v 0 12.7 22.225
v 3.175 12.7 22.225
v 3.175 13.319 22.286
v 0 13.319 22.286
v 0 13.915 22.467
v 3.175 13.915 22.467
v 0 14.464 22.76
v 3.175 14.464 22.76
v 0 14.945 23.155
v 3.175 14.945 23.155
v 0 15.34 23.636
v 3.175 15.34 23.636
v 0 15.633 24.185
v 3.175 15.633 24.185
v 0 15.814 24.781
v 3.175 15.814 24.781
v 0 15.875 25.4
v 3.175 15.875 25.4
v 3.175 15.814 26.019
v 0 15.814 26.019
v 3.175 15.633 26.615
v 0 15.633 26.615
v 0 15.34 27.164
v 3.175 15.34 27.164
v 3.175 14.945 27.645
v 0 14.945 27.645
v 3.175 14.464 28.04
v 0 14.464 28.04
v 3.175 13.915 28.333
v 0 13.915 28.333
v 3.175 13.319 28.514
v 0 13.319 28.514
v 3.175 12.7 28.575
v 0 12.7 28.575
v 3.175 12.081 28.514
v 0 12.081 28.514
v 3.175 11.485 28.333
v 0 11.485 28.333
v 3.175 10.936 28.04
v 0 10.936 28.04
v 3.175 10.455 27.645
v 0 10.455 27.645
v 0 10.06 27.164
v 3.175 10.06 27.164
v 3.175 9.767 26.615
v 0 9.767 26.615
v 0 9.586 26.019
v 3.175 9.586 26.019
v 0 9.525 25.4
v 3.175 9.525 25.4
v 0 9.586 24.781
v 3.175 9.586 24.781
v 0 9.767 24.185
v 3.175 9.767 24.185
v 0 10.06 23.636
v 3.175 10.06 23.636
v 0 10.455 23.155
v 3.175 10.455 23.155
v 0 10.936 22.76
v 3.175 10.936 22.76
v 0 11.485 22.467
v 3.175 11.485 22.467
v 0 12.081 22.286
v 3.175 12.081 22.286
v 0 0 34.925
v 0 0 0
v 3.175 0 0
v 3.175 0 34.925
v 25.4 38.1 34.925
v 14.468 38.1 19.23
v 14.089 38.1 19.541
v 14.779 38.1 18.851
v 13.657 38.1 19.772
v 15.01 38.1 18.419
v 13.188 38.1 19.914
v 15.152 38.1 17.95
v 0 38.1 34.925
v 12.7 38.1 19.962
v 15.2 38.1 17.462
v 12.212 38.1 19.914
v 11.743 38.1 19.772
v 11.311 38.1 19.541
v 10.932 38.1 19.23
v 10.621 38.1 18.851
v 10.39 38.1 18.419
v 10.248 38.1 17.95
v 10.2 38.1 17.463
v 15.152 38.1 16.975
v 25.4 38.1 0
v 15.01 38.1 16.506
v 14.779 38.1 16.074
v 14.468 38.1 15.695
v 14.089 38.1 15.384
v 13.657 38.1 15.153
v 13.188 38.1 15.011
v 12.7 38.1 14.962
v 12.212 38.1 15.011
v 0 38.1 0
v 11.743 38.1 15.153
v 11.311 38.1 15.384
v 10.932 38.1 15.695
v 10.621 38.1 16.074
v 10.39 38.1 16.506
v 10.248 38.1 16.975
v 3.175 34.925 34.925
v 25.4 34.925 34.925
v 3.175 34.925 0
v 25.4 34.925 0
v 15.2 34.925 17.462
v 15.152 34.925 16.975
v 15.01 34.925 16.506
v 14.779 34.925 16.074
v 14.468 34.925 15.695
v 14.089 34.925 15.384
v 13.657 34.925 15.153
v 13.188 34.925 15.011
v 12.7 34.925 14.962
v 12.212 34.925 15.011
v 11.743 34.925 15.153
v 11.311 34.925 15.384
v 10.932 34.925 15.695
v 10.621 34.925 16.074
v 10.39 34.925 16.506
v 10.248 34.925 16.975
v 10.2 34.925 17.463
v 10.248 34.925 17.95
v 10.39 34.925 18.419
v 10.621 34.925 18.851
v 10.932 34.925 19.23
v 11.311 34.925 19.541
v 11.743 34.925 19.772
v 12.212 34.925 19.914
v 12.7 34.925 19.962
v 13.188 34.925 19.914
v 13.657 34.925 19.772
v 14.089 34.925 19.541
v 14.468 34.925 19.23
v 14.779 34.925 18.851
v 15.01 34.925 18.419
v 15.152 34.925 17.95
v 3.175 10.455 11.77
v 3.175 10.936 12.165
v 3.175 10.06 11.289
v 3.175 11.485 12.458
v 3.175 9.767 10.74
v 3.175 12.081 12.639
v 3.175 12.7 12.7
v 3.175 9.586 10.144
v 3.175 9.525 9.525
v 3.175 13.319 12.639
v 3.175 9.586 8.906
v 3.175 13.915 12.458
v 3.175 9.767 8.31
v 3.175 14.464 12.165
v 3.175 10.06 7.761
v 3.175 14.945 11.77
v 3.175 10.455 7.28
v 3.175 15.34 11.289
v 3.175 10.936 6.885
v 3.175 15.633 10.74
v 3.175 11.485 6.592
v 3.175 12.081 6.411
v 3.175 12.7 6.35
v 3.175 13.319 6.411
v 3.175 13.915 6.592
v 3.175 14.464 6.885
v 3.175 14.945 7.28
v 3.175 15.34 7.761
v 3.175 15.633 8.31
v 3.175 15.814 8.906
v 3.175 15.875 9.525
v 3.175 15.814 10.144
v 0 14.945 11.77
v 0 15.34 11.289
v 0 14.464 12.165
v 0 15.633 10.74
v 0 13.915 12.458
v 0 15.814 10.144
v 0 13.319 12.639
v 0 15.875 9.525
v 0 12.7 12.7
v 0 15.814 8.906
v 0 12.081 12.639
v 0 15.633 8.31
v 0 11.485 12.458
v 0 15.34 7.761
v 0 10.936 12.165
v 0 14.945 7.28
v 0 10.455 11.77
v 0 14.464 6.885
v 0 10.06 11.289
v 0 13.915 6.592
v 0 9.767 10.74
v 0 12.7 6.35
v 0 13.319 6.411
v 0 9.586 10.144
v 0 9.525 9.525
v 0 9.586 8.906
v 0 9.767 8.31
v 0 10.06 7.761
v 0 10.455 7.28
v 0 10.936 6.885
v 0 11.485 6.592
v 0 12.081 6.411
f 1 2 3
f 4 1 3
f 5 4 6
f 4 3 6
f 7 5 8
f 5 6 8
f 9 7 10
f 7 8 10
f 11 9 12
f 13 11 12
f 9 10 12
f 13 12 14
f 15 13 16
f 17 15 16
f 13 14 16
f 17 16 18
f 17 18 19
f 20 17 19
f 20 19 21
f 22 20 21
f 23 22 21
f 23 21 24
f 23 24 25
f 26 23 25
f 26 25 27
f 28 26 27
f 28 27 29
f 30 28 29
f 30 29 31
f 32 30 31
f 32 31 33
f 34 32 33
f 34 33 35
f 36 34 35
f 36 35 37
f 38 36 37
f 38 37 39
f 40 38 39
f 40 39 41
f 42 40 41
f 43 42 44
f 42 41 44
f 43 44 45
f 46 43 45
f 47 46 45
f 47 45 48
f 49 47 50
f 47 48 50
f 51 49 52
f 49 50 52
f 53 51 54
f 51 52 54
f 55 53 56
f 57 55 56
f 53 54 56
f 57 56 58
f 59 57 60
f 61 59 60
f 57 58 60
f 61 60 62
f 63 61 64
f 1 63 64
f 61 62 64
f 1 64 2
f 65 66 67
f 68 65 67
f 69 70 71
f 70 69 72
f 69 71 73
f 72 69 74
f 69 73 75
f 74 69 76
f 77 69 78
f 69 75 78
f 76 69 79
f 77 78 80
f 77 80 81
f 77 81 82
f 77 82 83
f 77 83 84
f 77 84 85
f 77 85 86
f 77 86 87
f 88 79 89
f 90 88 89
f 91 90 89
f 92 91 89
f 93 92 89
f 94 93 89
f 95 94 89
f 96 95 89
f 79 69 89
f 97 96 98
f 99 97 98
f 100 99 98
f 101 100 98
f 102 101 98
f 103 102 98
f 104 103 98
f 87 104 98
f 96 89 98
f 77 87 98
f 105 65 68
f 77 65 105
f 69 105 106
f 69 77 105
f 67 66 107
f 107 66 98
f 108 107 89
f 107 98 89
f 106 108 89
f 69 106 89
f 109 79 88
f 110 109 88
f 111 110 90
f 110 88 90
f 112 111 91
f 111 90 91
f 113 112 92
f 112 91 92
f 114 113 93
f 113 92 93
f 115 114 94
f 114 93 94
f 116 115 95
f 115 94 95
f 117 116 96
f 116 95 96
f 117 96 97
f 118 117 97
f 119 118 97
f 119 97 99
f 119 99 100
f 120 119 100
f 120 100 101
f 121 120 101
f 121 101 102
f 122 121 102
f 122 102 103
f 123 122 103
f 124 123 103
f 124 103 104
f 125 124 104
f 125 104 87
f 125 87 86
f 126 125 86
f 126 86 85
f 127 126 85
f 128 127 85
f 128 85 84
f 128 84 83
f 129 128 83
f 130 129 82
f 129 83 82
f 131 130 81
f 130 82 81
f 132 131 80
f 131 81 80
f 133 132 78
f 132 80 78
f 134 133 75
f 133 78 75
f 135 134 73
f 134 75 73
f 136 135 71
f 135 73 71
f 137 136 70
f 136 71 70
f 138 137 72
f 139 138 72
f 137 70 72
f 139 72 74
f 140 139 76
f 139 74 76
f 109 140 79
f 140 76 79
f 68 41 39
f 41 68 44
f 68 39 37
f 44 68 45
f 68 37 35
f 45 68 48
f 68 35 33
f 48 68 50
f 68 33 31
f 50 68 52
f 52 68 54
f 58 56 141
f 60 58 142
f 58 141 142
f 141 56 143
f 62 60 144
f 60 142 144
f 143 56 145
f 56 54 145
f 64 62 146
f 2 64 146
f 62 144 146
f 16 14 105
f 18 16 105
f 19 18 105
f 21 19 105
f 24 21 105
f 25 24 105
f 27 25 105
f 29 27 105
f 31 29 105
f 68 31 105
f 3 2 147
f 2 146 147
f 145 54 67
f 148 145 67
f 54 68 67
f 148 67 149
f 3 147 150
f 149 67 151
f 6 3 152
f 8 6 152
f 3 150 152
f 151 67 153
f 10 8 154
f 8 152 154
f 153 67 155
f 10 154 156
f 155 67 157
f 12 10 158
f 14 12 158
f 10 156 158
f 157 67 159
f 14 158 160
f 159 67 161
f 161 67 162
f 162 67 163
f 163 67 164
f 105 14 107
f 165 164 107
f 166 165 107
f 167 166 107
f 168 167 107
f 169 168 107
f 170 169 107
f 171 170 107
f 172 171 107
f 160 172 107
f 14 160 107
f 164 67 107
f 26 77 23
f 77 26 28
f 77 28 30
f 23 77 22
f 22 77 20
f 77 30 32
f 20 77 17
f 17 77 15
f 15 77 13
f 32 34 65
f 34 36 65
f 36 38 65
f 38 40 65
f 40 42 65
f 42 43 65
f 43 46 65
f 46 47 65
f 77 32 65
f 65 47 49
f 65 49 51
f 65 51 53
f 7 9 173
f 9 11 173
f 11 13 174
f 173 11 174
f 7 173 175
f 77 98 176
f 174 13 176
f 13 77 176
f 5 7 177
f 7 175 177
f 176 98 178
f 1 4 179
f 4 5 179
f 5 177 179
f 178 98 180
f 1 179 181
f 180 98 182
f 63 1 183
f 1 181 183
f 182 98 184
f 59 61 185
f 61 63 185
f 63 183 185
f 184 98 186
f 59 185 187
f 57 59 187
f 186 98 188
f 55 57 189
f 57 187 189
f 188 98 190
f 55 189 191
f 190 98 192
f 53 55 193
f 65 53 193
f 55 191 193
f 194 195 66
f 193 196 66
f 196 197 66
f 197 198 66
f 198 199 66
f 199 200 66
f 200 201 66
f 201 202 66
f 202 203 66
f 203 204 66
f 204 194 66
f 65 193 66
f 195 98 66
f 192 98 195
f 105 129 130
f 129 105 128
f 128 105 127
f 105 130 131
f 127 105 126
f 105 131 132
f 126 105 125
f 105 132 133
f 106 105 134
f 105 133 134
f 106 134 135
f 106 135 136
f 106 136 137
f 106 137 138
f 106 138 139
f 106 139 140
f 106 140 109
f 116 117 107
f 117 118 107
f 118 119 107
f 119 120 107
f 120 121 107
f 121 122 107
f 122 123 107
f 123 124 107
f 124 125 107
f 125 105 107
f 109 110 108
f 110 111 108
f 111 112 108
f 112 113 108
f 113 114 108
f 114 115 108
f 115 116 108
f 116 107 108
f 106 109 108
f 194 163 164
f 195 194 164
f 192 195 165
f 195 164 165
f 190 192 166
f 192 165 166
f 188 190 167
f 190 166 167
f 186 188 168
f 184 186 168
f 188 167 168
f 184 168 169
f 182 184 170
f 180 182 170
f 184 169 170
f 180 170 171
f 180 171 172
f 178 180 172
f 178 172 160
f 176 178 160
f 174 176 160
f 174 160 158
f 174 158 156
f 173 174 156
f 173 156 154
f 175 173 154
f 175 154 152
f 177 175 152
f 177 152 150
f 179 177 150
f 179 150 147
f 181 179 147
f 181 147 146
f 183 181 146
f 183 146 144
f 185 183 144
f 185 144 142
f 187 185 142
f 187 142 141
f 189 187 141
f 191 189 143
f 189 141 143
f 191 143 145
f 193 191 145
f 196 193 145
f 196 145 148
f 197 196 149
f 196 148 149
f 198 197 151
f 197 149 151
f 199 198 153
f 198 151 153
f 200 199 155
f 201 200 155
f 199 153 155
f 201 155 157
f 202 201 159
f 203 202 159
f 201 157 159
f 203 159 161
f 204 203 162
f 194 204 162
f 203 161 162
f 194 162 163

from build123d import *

# Parameters (mm, degrees)
BOSS_EXTRUDE1_DEPTH = 34.925
SKETCH2_R           = 3.175
CUT_EXTRUDE1_DEPTH  = 4.175
SKETCH3_R           = 2.5
CUT_EXTRUDE2_DEPTH  = 39.1


with BuildPart() as part:
    # Sketch1 → Boss-Extrude1 (new body)
    with BuildSketch(Plane.XY):
        Polygon((0, 0), (3.175, 0), (3.175, 34.925), (25.4, 34.925), (25.4, 38.1), (0, 38.1), align=None)
    extrude(amount=BOSS_EXTRUDE1_DEPTH)

    # Sketch2 → Cut-Extrude1 (cut, through all)
    with BuildSketch(Plane(origin=(3.175, 0, 0), x_dir=(0, 0, -1), z_dir=(1, 0, 0))):
        with Locations((-25.4, 12.7)):
            Circle(SKETCH2_R)
        with Locations((-9.525, 12.7)):
            Circle(SKETCH2_R)
    extrude(amount=-CUT_EXTRUDE1_DEPTH, mode=Mode.SUBTRACT)

    # Sketch3 → Cut-Extrude2 (cut, through all)
    with BuildSketch(Plane(origin=(0, 38.1, 0), x_dir=(1, 0, 0), z_dir=(0, 1, 0))):
        with Locations((12.7, -17.4625)):
            Circle(SKETCH3_R)
    extrude(amount=-CUT_EXTRUDE2_DEPTH, mode=Mode.SUBTRACT)


solid = part.part
